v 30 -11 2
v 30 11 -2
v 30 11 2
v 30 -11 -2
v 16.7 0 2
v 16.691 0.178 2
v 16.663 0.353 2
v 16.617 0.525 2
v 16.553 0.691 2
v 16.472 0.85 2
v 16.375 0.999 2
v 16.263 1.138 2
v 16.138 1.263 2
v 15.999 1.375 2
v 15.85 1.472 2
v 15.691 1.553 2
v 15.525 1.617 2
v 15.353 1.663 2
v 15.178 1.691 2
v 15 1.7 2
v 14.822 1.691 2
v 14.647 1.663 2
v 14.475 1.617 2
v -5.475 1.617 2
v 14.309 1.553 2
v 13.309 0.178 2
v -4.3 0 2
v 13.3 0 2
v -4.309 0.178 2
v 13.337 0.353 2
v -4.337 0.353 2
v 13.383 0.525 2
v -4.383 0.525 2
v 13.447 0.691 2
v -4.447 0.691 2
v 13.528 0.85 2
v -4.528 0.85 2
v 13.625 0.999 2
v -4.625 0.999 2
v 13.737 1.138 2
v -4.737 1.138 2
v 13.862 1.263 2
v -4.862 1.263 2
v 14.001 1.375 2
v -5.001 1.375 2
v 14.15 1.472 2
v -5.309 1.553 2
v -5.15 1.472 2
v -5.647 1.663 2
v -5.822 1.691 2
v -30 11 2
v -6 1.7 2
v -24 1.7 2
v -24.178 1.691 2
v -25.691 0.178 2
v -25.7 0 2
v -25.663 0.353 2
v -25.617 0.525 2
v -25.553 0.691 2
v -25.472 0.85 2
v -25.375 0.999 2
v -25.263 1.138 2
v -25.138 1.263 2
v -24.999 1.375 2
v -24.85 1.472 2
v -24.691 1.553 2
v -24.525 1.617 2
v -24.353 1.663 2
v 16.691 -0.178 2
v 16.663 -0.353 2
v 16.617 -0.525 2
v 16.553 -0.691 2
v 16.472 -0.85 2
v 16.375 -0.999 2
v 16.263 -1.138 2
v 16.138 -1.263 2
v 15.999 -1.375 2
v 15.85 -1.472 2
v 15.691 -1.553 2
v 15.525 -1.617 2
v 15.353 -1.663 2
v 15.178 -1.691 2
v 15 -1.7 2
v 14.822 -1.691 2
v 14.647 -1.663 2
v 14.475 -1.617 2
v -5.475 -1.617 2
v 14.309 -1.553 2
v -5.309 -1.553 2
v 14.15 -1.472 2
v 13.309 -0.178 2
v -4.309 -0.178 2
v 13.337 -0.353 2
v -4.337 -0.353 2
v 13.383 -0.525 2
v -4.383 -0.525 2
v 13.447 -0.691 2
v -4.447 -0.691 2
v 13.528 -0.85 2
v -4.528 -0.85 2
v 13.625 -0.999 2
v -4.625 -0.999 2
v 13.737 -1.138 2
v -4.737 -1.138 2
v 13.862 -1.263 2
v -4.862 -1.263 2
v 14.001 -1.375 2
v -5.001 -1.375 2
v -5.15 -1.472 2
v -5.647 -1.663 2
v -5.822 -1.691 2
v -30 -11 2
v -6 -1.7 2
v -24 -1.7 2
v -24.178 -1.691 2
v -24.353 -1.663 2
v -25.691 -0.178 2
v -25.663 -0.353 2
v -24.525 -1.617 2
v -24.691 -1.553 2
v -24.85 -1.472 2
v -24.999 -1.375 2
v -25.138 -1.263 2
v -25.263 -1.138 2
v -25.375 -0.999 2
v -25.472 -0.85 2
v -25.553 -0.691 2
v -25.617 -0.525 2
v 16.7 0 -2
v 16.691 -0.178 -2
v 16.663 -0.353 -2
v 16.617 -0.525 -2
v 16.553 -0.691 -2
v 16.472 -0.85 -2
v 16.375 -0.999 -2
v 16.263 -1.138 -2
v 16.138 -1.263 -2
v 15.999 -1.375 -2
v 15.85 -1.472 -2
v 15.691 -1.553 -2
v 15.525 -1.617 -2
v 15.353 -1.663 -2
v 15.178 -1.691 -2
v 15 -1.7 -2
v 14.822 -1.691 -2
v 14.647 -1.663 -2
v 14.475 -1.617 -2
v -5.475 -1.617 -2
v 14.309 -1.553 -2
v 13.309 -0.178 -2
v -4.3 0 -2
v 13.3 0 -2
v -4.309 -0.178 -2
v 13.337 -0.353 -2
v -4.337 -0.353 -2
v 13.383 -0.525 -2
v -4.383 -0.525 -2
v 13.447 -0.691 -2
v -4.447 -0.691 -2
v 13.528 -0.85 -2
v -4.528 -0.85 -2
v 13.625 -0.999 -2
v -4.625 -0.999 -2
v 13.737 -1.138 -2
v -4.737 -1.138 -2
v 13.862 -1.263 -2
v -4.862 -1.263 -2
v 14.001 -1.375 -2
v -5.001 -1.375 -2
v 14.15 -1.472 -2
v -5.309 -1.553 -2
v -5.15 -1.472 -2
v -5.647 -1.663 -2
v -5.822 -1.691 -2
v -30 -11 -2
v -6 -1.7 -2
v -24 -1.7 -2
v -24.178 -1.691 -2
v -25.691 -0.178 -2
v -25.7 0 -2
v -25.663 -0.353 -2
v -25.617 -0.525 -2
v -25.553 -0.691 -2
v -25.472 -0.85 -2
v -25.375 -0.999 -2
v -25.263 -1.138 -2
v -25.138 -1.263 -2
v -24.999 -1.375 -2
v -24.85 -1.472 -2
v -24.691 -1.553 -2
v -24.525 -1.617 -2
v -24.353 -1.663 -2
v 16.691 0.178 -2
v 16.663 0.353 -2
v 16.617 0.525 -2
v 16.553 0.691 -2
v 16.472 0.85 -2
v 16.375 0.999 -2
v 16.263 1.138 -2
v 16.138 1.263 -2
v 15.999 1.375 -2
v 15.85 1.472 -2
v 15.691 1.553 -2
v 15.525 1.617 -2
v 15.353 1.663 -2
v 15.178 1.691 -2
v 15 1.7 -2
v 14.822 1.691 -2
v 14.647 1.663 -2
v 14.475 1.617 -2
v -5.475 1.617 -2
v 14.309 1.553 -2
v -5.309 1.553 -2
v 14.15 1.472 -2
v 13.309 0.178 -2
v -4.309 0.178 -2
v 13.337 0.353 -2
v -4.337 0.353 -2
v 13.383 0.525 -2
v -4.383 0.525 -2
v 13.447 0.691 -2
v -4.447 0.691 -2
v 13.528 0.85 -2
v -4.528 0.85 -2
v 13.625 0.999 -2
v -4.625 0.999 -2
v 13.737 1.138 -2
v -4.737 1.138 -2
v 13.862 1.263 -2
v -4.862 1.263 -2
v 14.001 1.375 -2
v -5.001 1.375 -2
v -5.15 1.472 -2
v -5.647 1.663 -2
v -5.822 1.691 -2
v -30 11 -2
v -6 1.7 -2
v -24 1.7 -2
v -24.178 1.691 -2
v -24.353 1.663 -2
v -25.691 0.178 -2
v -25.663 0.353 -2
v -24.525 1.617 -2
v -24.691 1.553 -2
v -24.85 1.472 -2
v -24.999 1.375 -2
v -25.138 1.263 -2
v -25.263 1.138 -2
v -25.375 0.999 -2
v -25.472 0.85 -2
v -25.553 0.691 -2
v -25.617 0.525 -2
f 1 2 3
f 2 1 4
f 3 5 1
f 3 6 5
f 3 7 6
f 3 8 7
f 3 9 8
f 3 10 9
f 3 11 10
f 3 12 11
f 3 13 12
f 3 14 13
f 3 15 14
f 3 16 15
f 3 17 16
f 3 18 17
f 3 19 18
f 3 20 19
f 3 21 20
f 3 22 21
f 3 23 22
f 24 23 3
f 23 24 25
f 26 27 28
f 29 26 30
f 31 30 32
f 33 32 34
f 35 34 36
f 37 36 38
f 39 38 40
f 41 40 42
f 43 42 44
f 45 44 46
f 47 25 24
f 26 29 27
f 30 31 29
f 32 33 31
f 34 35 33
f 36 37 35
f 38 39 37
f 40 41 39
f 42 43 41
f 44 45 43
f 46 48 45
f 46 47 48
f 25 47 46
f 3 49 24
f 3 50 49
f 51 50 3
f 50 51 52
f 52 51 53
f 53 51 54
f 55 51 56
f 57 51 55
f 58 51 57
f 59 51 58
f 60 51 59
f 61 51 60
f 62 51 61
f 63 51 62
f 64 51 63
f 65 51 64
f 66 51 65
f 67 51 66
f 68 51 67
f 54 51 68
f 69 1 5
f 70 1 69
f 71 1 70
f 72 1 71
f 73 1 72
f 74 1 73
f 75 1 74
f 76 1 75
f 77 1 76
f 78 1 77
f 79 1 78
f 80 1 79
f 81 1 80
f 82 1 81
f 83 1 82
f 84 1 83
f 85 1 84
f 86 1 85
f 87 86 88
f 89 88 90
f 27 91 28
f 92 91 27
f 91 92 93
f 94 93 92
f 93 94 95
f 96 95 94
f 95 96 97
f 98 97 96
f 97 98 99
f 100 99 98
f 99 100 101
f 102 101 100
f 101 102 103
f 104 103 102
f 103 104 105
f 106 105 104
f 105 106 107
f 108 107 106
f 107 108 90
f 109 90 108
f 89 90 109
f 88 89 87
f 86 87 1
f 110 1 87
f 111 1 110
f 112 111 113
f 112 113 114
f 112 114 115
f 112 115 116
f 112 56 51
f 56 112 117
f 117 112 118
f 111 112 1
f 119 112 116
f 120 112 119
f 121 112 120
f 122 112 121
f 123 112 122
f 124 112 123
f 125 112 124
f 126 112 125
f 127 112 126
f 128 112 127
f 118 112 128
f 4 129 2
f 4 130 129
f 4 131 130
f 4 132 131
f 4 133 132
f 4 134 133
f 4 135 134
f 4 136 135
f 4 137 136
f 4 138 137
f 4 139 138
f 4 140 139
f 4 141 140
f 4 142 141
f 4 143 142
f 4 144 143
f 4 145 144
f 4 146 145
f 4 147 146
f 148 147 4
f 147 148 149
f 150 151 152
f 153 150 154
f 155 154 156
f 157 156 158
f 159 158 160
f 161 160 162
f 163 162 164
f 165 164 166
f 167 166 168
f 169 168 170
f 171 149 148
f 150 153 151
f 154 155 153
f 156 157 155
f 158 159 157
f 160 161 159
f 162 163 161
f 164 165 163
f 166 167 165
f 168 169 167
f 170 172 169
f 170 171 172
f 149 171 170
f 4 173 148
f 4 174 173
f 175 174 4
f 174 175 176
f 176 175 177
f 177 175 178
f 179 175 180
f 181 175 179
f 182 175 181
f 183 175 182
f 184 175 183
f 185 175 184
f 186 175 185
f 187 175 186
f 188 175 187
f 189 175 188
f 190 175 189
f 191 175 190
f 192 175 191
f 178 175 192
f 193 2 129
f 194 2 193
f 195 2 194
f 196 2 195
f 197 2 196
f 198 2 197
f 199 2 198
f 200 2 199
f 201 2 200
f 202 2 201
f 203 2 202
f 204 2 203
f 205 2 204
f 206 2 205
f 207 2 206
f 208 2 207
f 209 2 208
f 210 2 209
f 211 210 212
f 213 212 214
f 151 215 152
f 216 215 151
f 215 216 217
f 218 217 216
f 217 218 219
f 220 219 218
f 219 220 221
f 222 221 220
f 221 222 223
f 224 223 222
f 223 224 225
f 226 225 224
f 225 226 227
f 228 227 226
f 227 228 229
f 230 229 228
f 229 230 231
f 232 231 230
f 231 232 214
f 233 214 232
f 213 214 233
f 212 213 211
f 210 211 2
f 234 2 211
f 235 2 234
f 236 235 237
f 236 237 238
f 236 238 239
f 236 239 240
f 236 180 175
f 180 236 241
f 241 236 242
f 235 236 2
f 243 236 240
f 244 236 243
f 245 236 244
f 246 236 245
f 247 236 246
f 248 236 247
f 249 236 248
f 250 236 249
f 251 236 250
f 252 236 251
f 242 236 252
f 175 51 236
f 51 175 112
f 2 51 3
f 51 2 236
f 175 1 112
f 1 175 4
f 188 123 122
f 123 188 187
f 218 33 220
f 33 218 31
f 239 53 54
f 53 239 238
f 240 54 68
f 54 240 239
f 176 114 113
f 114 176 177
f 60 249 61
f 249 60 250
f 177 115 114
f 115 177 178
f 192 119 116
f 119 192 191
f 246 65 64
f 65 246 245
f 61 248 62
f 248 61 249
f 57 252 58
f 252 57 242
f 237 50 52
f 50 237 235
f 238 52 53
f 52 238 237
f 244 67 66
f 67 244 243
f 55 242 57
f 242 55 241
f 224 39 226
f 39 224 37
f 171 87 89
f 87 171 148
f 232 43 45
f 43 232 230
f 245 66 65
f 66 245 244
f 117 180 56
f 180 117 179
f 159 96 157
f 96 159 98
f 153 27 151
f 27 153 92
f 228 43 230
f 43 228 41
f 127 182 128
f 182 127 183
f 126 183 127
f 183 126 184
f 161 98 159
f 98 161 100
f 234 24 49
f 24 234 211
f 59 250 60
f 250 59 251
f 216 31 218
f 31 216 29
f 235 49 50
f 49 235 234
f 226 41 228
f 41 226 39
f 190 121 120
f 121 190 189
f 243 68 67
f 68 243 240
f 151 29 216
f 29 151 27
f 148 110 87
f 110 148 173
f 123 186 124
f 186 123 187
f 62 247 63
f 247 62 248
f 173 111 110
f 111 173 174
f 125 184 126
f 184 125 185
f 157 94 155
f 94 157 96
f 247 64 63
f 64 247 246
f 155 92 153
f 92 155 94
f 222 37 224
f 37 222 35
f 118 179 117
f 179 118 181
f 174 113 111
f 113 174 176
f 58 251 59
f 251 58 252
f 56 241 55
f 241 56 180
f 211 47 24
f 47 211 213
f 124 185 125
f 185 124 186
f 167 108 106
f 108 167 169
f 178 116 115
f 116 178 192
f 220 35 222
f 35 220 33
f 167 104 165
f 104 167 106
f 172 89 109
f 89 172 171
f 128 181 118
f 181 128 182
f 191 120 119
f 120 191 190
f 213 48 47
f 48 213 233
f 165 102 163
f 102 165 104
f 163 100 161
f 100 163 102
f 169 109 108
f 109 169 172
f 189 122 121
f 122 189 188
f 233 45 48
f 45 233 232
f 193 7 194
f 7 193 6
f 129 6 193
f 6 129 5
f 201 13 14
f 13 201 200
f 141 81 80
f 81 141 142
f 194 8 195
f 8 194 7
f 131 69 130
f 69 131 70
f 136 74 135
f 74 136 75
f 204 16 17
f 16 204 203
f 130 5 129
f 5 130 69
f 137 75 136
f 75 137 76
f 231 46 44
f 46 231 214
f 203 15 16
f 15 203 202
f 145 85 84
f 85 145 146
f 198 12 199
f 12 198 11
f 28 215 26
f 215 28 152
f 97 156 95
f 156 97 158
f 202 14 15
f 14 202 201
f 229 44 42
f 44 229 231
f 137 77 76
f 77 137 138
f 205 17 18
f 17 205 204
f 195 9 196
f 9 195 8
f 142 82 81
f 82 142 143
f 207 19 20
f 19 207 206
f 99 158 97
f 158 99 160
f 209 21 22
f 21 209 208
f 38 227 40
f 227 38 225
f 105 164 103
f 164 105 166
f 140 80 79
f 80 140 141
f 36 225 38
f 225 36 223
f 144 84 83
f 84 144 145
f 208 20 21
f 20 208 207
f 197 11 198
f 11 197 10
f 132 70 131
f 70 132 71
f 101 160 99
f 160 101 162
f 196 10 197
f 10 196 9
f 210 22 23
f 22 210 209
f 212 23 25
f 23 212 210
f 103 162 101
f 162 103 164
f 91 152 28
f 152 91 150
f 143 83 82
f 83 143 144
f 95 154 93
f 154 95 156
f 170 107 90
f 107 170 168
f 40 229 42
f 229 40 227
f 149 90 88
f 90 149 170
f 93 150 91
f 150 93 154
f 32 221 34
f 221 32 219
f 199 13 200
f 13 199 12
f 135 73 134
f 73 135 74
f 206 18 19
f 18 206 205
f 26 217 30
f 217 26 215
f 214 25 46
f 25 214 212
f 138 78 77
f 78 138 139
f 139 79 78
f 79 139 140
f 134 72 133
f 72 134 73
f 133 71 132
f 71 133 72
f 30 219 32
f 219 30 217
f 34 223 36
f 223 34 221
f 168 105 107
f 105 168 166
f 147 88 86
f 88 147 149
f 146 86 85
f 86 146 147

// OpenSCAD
// Adjustable sensor mounting tab.
$fn = 60;
eps = 0.02;
length = 60;
width = 22;
thickness = 4;
slot_l = 18;
module slot(x) { hull() { translate([x-slot_l/2,0,-thickness/2-eps]) cylinder(d=3.4,h=thickness+2*eps); translate([x+slot_l/2,0,-thickness/2-eps]) cylinder(d=3.4,h=thickness+2*eps); } }
difference() { cube([length,width,thickness],center=true); slot(-length/4); translate([length/4,0,-thickness/2-eps]) cylinder(d=3.4,h=thickness+2*eps); }
